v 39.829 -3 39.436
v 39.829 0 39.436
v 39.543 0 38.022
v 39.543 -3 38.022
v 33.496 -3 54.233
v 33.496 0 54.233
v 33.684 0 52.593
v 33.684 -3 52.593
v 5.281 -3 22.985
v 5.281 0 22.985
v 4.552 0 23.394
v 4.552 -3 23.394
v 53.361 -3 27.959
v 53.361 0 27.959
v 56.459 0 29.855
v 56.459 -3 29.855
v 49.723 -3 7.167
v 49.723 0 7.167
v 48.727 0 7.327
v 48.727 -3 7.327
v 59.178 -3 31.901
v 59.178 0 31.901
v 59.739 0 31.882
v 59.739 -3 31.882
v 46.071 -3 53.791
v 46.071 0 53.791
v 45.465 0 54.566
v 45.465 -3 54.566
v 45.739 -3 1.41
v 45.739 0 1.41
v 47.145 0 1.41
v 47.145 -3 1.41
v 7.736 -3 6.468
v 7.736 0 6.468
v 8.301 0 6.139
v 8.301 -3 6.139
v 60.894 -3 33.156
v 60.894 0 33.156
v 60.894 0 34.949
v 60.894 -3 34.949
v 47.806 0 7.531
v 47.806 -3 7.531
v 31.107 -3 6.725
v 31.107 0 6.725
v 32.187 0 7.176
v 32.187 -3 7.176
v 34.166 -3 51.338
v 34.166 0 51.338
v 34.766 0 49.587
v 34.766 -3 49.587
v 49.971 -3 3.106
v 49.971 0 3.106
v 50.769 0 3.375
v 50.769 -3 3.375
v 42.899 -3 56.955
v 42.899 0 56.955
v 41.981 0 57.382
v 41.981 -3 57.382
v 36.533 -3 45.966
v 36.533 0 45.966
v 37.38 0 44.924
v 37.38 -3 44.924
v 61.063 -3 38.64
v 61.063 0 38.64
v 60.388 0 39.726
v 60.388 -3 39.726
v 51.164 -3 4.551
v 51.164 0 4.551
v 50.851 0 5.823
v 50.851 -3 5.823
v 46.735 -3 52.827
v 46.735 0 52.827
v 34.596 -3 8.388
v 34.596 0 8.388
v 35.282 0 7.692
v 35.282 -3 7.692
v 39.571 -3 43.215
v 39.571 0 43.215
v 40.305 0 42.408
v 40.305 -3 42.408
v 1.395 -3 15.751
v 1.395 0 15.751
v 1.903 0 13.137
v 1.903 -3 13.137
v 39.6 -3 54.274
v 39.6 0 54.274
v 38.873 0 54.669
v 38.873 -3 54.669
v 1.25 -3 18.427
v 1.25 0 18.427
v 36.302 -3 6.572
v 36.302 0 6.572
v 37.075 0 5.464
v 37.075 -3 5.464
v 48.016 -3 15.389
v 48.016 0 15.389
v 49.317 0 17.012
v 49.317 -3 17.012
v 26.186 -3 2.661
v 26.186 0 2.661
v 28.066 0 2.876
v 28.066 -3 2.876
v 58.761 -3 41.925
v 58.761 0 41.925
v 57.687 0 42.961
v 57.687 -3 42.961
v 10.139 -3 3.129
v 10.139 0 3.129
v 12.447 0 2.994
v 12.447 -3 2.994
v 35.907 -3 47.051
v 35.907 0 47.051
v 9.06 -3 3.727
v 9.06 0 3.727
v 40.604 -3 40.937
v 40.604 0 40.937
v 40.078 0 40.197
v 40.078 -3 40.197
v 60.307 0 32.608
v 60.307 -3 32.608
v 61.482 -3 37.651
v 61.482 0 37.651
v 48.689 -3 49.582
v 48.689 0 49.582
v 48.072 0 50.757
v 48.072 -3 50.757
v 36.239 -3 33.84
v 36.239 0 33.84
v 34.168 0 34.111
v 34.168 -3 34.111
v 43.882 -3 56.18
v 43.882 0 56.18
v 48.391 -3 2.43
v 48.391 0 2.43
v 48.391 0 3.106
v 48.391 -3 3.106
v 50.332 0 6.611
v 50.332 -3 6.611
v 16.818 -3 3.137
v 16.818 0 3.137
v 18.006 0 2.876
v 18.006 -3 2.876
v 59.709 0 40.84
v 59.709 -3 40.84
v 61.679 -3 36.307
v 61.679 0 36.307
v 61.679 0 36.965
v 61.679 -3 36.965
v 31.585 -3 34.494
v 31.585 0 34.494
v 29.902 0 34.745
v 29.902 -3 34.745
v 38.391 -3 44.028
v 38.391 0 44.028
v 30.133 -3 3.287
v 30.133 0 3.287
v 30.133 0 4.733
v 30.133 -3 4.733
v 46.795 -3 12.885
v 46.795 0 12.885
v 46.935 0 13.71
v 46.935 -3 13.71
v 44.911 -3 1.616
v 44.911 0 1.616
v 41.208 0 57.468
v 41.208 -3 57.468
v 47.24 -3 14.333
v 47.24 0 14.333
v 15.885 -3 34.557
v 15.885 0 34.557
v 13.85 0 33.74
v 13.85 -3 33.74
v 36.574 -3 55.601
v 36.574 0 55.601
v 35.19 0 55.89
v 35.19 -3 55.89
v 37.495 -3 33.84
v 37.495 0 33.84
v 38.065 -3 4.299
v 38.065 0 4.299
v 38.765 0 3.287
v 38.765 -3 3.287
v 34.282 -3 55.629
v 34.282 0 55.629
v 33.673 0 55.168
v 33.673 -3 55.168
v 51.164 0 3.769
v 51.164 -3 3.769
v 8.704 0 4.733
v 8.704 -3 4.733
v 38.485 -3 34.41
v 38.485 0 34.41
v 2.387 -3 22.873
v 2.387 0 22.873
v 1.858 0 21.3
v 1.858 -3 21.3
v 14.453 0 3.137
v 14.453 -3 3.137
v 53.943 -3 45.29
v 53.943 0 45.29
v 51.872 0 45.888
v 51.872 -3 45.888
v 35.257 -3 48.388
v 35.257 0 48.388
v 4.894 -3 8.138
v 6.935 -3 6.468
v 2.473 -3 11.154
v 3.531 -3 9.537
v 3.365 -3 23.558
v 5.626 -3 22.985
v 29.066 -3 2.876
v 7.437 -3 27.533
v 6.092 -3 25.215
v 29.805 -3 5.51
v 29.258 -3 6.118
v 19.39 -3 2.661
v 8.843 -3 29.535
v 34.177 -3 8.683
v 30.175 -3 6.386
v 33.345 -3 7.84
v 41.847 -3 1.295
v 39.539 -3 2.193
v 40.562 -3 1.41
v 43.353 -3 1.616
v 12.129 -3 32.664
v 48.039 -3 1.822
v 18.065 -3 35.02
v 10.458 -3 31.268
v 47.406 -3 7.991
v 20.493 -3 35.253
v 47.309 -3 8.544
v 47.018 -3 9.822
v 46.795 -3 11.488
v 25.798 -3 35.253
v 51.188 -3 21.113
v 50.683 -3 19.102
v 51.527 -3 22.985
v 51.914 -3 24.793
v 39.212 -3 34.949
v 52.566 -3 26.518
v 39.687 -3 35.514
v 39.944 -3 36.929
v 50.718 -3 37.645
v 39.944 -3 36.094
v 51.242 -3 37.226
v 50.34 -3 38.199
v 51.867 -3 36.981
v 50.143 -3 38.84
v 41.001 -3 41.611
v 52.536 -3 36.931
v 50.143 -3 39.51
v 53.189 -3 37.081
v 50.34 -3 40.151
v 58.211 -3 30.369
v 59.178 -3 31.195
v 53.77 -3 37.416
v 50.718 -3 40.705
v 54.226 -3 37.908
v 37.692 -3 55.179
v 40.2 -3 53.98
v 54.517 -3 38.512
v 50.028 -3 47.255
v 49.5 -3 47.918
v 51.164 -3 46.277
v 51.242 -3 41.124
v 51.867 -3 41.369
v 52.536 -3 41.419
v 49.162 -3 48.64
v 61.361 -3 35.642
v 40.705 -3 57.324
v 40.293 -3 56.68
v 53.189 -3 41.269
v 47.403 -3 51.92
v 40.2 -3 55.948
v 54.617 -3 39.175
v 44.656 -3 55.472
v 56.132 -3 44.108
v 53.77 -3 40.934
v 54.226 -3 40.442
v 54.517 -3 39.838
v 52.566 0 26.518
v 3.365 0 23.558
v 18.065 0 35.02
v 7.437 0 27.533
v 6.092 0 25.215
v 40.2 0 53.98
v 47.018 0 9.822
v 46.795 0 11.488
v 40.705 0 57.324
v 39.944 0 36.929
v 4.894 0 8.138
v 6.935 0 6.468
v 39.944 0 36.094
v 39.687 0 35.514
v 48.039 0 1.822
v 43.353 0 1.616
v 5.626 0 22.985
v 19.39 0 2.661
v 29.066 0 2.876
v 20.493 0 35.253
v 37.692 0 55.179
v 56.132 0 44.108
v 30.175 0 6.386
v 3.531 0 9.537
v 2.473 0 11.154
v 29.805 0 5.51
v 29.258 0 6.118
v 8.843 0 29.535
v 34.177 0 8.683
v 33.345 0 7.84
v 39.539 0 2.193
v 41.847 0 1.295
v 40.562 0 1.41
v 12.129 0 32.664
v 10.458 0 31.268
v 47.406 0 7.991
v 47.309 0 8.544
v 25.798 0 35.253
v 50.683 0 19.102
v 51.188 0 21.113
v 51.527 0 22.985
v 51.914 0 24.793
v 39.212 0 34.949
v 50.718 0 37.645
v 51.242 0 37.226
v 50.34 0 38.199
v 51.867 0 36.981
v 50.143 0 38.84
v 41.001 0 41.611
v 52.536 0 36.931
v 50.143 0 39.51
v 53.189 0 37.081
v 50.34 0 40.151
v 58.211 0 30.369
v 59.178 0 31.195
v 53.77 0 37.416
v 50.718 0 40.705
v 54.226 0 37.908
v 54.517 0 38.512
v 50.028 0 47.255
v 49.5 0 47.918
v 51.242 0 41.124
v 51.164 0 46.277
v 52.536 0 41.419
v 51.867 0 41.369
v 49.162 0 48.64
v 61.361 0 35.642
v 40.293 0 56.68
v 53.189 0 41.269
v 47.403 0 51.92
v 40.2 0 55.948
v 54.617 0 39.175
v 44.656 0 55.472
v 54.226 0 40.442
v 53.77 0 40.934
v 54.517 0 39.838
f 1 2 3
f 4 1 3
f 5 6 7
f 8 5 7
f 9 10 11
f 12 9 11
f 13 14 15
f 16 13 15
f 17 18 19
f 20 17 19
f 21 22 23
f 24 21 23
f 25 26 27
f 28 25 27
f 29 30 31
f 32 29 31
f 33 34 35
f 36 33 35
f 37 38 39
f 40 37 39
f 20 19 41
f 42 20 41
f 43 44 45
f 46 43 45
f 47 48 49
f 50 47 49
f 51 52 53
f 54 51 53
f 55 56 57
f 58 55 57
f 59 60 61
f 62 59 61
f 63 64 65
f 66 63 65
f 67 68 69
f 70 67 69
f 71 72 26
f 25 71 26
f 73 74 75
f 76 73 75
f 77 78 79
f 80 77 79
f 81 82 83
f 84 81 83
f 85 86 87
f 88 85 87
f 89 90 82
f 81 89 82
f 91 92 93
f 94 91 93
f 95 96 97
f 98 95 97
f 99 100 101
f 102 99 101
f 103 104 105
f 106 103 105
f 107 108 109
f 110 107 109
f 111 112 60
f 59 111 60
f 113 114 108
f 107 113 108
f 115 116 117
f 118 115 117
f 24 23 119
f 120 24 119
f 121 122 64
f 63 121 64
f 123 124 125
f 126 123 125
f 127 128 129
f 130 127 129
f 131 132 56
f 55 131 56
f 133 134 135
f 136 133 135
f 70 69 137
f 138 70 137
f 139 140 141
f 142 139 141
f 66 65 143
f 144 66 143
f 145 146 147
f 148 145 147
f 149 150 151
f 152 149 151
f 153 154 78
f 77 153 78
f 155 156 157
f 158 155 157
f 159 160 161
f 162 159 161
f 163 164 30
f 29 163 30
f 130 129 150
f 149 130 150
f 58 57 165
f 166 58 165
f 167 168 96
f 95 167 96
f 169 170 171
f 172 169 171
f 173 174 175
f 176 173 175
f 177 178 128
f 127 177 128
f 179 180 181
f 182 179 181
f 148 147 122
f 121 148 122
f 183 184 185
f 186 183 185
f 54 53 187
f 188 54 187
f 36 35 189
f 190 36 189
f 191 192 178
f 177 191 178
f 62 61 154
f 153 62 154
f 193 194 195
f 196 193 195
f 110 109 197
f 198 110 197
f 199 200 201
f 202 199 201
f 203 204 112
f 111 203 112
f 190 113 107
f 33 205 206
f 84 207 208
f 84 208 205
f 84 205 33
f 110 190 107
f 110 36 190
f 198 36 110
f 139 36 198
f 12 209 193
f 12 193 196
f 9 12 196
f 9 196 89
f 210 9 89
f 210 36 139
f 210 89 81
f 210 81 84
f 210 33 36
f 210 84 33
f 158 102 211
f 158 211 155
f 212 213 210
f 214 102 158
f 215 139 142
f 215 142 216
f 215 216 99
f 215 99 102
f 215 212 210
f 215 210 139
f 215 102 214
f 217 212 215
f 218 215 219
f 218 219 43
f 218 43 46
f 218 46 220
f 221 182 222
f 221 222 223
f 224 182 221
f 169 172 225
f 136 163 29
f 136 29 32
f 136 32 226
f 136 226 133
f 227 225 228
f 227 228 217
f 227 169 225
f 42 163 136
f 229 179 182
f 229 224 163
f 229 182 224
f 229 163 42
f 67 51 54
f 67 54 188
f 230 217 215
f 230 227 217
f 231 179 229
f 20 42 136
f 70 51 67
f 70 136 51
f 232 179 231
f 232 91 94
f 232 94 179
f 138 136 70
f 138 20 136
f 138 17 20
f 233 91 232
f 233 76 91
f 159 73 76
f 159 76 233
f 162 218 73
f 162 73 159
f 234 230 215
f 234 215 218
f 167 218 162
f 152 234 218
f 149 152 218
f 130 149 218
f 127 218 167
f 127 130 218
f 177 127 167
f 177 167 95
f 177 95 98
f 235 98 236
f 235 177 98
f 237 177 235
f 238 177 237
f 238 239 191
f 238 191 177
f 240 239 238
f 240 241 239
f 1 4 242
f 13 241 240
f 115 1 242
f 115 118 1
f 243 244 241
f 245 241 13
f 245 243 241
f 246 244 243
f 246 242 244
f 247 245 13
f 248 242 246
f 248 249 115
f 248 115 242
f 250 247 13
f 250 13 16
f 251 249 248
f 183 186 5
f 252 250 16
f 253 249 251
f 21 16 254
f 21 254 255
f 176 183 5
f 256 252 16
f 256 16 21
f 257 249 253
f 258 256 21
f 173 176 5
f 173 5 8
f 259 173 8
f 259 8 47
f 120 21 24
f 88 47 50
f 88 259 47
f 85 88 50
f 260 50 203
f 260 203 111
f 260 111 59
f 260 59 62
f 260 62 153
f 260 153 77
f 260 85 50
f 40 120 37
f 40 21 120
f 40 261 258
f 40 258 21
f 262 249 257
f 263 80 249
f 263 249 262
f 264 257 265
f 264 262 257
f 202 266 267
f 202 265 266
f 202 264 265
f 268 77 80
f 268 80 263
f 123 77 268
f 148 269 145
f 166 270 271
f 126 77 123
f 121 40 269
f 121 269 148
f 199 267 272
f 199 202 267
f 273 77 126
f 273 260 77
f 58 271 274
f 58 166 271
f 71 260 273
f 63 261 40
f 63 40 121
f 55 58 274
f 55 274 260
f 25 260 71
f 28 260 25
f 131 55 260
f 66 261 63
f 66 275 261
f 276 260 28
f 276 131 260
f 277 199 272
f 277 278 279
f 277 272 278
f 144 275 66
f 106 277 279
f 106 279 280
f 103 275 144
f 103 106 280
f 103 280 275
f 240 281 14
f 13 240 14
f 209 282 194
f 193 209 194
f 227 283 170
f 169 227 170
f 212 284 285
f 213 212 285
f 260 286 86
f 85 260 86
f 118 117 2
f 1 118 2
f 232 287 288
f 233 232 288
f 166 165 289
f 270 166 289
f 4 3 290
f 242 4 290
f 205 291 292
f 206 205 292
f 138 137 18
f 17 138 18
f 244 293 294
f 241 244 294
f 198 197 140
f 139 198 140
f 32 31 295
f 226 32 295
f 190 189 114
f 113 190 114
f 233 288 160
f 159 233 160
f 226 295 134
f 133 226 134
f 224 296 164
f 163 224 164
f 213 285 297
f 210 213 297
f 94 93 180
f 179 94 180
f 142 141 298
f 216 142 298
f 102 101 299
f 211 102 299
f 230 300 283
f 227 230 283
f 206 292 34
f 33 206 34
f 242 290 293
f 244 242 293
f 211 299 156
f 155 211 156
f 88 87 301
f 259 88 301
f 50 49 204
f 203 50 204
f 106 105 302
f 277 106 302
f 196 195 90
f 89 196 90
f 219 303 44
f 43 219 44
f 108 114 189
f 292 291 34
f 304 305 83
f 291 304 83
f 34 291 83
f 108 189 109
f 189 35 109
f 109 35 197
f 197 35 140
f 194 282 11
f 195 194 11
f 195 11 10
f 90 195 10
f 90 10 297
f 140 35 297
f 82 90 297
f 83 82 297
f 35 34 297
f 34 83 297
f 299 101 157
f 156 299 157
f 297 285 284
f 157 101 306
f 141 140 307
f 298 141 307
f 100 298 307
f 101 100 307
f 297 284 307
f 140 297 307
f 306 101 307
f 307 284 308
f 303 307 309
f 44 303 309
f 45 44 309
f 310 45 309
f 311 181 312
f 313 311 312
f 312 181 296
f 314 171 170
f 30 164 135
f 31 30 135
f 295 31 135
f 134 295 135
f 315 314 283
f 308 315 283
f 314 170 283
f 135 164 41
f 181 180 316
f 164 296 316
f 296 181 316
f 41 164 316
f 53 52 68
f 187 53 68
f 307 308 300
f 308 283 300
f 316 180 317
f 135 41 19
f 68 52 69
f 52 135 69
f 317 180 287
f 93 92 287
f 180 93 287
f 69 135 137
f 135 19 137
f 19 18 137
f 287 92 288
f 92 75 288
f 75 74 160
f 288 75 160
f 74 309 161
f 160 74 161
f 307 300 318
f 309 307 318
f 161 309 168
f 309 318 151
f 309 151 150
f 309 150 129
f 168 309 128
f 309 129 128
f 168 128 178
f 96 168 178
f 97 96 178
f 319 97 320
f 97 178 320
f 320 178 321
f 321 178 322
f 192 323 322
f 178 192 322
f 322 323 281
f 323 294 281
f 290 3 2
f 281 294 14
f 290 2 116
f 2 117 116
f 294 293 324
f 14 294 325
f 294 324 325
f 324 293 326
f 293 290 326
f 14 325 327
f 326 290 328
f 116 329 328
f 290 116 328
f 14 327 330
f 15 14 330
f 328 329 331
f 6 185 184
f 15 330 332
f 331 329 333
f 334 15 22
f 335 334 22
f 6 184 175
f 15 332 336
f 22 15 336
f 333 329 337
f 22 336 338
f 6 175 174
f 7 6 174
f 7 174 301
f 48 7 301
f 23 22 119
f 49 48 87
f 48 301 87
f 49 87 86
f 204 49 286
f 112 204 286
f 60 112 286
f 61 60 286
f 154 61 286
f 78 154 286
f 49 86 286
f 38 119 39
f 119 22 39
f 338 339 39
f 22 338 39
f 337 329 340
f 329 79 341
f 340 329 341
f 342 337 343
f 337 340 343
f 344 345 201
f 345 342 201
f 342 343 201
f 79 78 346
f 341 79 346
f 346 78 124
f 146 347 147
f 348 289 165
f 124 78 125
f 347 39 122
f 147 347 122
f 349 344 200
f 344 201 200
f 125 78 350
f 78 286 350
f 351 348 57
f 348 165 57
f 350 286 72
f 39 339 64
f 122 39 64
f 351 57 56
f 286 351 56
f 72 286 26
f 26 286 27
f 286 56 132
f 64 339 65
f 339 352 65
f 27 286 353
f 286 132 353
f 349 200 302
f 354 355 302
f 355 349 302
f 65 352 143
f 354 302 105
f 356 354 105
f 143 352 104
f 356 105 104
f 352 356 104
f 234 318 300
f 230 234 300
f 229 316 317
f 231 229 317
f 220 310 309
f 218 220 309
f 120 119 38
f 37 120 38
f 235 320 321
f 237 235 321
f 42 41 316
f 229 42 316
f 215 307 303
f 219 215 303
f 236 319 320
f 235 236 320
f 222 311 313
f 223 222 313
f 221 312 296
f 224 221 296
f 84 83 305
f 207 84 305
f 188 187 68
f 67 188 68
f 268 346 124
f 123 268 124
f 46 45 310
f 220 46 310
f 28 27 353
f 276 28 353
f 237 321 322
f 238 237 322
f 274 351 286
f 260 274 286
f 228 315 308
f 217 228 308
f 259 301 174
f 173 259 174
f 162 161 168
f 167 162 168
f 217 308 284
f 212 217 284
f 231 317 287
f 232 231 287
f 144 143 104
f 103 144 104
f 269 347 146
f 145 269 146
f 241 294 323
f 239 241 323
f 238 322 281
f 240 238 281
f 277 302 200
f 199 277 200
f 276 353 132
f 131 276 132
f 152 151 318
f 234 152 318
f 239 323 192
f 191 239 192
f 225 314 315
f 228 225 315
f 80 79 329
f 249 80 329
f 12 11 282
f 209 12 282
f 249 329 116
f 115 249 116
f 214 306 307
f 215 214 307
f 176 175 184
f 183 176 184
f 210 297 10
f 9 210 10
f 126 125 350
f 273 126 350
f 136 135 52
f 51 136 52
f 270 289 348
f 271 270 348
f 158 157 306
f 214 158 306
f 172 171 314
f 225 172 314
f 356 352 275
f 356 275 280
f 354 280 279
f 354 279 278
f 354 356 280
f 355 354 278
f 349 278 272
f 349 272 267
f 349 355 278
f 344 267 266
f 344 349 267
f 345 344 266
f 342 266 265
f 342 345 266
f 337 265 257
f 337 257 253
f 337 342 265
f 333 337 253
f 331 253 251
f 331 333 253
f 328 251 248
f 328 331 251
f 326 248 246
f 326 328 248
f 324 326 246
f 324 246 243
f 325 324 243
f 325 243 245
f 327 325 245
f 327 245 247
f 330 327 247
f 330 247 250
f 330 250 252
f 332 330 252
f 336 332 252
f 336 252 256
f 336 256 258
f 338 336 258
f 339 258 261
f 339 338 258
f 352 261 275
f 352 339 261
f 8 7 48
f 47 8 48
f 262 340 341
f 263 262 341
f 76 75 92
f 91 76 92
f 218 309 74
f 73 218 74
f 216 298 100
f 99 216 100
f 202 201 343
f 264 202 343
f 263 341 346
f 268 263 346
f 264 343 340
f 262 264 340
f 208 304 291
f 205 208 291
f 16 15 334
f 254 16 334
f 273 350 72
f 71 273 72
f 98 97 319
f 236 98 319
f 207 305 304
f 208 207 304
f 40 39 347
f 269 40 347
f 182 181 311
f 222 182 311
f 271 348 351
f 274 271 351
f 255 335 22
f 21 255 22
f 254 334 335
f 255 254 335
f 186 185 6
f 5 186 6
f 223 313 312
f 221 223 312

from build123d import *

# Parameters (mm, degrees)
F0_R     = 2.25
F1_DEPTH = 3


with BuildPart() as f1:
    # F0 (on Front) → F1 (new body)
    with BuildSketch(Plane.XZ):
        Polygon((59.17797, 31.194587), (59.17797, 31.900588), (59.738858, 31.881615), (60.307068, 32.607616), (60.893968, 33.156025), (60.893968, 33.944442), (60.893968, 34.949179), (61.360855, 35.642351), (61.679476, 36.30662), (61.679476, 36.964568), (61.482426, 37.650985), (61.062581, 38.640238), (60.388171, 39.726486), (59.709248, 40.840028), (58.760794, 41.924554), (57.686546, 42.960874), (56.13193, 44.108019), (53.9429, 45.290024), (51.871779, 45.888075), (51.164123, 46.276766), (50.027608, 47.254788), (49.500446, 47.917502), (49.162385, 48.640302), (48.689091, 49.58215), (48.072106, 50.756746), (47.402845, 51.920425), (46.735066, 52.826829), (46.07114, 53.790702), (45.464824, 54.565684), (44.656431, 55.471539), (43.882285, 56.180216), (42.898628, 56.955005), (41.981423, 57.381575), (41.207883, 57.468069), (40.705001, 57.323706), (40.293103, 56.680384), (40.199735, 55.948148), (40.199735, 53.980475), (39.600259, 54.273897), (38.873113, 54.669222), (37.691645, 55.178945), (36.573572, 55.601232), (35.189915, 55.889827), (34.28163, 55.629085), (33.673137, 55.168423), (33.496248, 54.232587), (33.683778, 52.592809), (34.165904, 51.337972), (34.766386, 49.587351), (35.256976, 48.387687), (35.906764, 47.050612), (36.533276, 45.966415), (37.37989, 44.924222), (38.390851, 44.028023), (39.571477, 43.215491), (40.304705, 42.407678), (41.001196, 41.611003), (40.603713, 40.936851), (40.078084, 40.196856), (39.829461, 39.436208), (39.542939, 38.021807), (39.943556, 36.928817), (39.943556, 36.094203), (39.686826, 35.513923), (39.211509, 34.949179), (38.484942, 34.410313), (37.494795, 33.839713), (36.238837, 33.839713), (34.168248, 34.110547), (31.584672, 34.494312), (29.90189, 34.744845), (25.798248, 35.253315), (22.933811, 35.253315), (20.492591, 35.253315), (18.065328, 35.020179), (15.885449, 34.556809), (13.849761, 33.73976), (12.129347, 32.664482), (10.457839, 31.268078), (8.842911, 29.534917), (7.437296, 27.533482), (6.092134, 25.215313), (5.626353, 22.985314), (5.281105, 22.985314), (4.552305, 23.394156), (3.3653, 23.558287), (2.386902, 22.873478), (1.858065, 21.299662), (1.250321, 18.427405), (1.39535, 15.751299), (1.9034, 13.137148), (2.472708, 11.153989), (3.530675, 9.537014), (4.893567, 8.13821), (6.934674, 6.468246), (7.735685, 6.468246), (8.300671, 6.139061), (8.704288, 4.733078), (9.059932, 3.727228), (10.139112, 3.128539), (12.447312, 2.994476), (14.452639, 3.13662), (16.818212, 3.13662), (18.006043, 2.876388), (19.390354, 2.661495), (21.883129, 2.661495), (23.743564, 2.661495), (26.185988, 2.661495), (28.06579, 2.876388), (29.066299, 2.876388), (30.133199, 3.287267), (30.133199, 3.511565), (30.133199, 4.072266), (30.133199, 4.733231), (29.804504, 5.510292), (29.258075, 6.118042), (30.175305, 6.385948), (31.107011, 6.724561), (32.186629, 7.175799), (33.344732, 7.840062), (34.17739, 8.683063), (34.59618, 8.388327), (35.282453, 7.692138), (36.302242, 6.572426), (37.074772, 5.464323), (38.065363, 4.298558), (38.765096, 3.287267), (39.539397, 2.19271), (40.561764, 1.410144), (41.847485, 1.295176), (43.353376, 1.616231), (44.911167, 1.616231), (45.73869, 1.410144), (47.144735, 1.410144), (48.039055, 1.821825), (48.391114, 2.430058), (48.391114, 3.106444), (49.971162, 3.106444), (50.76906, 3.37499), (51.164123, 3.768711), (51.164123, 4.550725), (50.851106, 5.822739), (50.331727, 6.610573), (49.723235, 7.166963), (48.727288, 7.327425), (47.805995, 7.531474), (47.405892, 7.991314), (47.309159, 8.544259), (47.017634, 9.822114), (46.794978, 11.487763), (46.794978, 12.884877), (46.934963, 13.710026), (47.239665, 14.333159), (48.015684, 15.389006), (49.316895, 17.012446), (50.68293, 19.101975), (51.188018, 21.113079), (51.526973, 22.985314), (51.914252, 24.793496), (52.566426, 26.517666), (53.361181, 27.959348), (56.45878, 29.854865), (58.211347, 30.368955), align=None)
        with Locations((52.367389, 39.174978)):
            Circle(F0_R, mode=Mode.SUBTRACT)
    extrude(amount=F1_DEPTH)


solid = f1.part
